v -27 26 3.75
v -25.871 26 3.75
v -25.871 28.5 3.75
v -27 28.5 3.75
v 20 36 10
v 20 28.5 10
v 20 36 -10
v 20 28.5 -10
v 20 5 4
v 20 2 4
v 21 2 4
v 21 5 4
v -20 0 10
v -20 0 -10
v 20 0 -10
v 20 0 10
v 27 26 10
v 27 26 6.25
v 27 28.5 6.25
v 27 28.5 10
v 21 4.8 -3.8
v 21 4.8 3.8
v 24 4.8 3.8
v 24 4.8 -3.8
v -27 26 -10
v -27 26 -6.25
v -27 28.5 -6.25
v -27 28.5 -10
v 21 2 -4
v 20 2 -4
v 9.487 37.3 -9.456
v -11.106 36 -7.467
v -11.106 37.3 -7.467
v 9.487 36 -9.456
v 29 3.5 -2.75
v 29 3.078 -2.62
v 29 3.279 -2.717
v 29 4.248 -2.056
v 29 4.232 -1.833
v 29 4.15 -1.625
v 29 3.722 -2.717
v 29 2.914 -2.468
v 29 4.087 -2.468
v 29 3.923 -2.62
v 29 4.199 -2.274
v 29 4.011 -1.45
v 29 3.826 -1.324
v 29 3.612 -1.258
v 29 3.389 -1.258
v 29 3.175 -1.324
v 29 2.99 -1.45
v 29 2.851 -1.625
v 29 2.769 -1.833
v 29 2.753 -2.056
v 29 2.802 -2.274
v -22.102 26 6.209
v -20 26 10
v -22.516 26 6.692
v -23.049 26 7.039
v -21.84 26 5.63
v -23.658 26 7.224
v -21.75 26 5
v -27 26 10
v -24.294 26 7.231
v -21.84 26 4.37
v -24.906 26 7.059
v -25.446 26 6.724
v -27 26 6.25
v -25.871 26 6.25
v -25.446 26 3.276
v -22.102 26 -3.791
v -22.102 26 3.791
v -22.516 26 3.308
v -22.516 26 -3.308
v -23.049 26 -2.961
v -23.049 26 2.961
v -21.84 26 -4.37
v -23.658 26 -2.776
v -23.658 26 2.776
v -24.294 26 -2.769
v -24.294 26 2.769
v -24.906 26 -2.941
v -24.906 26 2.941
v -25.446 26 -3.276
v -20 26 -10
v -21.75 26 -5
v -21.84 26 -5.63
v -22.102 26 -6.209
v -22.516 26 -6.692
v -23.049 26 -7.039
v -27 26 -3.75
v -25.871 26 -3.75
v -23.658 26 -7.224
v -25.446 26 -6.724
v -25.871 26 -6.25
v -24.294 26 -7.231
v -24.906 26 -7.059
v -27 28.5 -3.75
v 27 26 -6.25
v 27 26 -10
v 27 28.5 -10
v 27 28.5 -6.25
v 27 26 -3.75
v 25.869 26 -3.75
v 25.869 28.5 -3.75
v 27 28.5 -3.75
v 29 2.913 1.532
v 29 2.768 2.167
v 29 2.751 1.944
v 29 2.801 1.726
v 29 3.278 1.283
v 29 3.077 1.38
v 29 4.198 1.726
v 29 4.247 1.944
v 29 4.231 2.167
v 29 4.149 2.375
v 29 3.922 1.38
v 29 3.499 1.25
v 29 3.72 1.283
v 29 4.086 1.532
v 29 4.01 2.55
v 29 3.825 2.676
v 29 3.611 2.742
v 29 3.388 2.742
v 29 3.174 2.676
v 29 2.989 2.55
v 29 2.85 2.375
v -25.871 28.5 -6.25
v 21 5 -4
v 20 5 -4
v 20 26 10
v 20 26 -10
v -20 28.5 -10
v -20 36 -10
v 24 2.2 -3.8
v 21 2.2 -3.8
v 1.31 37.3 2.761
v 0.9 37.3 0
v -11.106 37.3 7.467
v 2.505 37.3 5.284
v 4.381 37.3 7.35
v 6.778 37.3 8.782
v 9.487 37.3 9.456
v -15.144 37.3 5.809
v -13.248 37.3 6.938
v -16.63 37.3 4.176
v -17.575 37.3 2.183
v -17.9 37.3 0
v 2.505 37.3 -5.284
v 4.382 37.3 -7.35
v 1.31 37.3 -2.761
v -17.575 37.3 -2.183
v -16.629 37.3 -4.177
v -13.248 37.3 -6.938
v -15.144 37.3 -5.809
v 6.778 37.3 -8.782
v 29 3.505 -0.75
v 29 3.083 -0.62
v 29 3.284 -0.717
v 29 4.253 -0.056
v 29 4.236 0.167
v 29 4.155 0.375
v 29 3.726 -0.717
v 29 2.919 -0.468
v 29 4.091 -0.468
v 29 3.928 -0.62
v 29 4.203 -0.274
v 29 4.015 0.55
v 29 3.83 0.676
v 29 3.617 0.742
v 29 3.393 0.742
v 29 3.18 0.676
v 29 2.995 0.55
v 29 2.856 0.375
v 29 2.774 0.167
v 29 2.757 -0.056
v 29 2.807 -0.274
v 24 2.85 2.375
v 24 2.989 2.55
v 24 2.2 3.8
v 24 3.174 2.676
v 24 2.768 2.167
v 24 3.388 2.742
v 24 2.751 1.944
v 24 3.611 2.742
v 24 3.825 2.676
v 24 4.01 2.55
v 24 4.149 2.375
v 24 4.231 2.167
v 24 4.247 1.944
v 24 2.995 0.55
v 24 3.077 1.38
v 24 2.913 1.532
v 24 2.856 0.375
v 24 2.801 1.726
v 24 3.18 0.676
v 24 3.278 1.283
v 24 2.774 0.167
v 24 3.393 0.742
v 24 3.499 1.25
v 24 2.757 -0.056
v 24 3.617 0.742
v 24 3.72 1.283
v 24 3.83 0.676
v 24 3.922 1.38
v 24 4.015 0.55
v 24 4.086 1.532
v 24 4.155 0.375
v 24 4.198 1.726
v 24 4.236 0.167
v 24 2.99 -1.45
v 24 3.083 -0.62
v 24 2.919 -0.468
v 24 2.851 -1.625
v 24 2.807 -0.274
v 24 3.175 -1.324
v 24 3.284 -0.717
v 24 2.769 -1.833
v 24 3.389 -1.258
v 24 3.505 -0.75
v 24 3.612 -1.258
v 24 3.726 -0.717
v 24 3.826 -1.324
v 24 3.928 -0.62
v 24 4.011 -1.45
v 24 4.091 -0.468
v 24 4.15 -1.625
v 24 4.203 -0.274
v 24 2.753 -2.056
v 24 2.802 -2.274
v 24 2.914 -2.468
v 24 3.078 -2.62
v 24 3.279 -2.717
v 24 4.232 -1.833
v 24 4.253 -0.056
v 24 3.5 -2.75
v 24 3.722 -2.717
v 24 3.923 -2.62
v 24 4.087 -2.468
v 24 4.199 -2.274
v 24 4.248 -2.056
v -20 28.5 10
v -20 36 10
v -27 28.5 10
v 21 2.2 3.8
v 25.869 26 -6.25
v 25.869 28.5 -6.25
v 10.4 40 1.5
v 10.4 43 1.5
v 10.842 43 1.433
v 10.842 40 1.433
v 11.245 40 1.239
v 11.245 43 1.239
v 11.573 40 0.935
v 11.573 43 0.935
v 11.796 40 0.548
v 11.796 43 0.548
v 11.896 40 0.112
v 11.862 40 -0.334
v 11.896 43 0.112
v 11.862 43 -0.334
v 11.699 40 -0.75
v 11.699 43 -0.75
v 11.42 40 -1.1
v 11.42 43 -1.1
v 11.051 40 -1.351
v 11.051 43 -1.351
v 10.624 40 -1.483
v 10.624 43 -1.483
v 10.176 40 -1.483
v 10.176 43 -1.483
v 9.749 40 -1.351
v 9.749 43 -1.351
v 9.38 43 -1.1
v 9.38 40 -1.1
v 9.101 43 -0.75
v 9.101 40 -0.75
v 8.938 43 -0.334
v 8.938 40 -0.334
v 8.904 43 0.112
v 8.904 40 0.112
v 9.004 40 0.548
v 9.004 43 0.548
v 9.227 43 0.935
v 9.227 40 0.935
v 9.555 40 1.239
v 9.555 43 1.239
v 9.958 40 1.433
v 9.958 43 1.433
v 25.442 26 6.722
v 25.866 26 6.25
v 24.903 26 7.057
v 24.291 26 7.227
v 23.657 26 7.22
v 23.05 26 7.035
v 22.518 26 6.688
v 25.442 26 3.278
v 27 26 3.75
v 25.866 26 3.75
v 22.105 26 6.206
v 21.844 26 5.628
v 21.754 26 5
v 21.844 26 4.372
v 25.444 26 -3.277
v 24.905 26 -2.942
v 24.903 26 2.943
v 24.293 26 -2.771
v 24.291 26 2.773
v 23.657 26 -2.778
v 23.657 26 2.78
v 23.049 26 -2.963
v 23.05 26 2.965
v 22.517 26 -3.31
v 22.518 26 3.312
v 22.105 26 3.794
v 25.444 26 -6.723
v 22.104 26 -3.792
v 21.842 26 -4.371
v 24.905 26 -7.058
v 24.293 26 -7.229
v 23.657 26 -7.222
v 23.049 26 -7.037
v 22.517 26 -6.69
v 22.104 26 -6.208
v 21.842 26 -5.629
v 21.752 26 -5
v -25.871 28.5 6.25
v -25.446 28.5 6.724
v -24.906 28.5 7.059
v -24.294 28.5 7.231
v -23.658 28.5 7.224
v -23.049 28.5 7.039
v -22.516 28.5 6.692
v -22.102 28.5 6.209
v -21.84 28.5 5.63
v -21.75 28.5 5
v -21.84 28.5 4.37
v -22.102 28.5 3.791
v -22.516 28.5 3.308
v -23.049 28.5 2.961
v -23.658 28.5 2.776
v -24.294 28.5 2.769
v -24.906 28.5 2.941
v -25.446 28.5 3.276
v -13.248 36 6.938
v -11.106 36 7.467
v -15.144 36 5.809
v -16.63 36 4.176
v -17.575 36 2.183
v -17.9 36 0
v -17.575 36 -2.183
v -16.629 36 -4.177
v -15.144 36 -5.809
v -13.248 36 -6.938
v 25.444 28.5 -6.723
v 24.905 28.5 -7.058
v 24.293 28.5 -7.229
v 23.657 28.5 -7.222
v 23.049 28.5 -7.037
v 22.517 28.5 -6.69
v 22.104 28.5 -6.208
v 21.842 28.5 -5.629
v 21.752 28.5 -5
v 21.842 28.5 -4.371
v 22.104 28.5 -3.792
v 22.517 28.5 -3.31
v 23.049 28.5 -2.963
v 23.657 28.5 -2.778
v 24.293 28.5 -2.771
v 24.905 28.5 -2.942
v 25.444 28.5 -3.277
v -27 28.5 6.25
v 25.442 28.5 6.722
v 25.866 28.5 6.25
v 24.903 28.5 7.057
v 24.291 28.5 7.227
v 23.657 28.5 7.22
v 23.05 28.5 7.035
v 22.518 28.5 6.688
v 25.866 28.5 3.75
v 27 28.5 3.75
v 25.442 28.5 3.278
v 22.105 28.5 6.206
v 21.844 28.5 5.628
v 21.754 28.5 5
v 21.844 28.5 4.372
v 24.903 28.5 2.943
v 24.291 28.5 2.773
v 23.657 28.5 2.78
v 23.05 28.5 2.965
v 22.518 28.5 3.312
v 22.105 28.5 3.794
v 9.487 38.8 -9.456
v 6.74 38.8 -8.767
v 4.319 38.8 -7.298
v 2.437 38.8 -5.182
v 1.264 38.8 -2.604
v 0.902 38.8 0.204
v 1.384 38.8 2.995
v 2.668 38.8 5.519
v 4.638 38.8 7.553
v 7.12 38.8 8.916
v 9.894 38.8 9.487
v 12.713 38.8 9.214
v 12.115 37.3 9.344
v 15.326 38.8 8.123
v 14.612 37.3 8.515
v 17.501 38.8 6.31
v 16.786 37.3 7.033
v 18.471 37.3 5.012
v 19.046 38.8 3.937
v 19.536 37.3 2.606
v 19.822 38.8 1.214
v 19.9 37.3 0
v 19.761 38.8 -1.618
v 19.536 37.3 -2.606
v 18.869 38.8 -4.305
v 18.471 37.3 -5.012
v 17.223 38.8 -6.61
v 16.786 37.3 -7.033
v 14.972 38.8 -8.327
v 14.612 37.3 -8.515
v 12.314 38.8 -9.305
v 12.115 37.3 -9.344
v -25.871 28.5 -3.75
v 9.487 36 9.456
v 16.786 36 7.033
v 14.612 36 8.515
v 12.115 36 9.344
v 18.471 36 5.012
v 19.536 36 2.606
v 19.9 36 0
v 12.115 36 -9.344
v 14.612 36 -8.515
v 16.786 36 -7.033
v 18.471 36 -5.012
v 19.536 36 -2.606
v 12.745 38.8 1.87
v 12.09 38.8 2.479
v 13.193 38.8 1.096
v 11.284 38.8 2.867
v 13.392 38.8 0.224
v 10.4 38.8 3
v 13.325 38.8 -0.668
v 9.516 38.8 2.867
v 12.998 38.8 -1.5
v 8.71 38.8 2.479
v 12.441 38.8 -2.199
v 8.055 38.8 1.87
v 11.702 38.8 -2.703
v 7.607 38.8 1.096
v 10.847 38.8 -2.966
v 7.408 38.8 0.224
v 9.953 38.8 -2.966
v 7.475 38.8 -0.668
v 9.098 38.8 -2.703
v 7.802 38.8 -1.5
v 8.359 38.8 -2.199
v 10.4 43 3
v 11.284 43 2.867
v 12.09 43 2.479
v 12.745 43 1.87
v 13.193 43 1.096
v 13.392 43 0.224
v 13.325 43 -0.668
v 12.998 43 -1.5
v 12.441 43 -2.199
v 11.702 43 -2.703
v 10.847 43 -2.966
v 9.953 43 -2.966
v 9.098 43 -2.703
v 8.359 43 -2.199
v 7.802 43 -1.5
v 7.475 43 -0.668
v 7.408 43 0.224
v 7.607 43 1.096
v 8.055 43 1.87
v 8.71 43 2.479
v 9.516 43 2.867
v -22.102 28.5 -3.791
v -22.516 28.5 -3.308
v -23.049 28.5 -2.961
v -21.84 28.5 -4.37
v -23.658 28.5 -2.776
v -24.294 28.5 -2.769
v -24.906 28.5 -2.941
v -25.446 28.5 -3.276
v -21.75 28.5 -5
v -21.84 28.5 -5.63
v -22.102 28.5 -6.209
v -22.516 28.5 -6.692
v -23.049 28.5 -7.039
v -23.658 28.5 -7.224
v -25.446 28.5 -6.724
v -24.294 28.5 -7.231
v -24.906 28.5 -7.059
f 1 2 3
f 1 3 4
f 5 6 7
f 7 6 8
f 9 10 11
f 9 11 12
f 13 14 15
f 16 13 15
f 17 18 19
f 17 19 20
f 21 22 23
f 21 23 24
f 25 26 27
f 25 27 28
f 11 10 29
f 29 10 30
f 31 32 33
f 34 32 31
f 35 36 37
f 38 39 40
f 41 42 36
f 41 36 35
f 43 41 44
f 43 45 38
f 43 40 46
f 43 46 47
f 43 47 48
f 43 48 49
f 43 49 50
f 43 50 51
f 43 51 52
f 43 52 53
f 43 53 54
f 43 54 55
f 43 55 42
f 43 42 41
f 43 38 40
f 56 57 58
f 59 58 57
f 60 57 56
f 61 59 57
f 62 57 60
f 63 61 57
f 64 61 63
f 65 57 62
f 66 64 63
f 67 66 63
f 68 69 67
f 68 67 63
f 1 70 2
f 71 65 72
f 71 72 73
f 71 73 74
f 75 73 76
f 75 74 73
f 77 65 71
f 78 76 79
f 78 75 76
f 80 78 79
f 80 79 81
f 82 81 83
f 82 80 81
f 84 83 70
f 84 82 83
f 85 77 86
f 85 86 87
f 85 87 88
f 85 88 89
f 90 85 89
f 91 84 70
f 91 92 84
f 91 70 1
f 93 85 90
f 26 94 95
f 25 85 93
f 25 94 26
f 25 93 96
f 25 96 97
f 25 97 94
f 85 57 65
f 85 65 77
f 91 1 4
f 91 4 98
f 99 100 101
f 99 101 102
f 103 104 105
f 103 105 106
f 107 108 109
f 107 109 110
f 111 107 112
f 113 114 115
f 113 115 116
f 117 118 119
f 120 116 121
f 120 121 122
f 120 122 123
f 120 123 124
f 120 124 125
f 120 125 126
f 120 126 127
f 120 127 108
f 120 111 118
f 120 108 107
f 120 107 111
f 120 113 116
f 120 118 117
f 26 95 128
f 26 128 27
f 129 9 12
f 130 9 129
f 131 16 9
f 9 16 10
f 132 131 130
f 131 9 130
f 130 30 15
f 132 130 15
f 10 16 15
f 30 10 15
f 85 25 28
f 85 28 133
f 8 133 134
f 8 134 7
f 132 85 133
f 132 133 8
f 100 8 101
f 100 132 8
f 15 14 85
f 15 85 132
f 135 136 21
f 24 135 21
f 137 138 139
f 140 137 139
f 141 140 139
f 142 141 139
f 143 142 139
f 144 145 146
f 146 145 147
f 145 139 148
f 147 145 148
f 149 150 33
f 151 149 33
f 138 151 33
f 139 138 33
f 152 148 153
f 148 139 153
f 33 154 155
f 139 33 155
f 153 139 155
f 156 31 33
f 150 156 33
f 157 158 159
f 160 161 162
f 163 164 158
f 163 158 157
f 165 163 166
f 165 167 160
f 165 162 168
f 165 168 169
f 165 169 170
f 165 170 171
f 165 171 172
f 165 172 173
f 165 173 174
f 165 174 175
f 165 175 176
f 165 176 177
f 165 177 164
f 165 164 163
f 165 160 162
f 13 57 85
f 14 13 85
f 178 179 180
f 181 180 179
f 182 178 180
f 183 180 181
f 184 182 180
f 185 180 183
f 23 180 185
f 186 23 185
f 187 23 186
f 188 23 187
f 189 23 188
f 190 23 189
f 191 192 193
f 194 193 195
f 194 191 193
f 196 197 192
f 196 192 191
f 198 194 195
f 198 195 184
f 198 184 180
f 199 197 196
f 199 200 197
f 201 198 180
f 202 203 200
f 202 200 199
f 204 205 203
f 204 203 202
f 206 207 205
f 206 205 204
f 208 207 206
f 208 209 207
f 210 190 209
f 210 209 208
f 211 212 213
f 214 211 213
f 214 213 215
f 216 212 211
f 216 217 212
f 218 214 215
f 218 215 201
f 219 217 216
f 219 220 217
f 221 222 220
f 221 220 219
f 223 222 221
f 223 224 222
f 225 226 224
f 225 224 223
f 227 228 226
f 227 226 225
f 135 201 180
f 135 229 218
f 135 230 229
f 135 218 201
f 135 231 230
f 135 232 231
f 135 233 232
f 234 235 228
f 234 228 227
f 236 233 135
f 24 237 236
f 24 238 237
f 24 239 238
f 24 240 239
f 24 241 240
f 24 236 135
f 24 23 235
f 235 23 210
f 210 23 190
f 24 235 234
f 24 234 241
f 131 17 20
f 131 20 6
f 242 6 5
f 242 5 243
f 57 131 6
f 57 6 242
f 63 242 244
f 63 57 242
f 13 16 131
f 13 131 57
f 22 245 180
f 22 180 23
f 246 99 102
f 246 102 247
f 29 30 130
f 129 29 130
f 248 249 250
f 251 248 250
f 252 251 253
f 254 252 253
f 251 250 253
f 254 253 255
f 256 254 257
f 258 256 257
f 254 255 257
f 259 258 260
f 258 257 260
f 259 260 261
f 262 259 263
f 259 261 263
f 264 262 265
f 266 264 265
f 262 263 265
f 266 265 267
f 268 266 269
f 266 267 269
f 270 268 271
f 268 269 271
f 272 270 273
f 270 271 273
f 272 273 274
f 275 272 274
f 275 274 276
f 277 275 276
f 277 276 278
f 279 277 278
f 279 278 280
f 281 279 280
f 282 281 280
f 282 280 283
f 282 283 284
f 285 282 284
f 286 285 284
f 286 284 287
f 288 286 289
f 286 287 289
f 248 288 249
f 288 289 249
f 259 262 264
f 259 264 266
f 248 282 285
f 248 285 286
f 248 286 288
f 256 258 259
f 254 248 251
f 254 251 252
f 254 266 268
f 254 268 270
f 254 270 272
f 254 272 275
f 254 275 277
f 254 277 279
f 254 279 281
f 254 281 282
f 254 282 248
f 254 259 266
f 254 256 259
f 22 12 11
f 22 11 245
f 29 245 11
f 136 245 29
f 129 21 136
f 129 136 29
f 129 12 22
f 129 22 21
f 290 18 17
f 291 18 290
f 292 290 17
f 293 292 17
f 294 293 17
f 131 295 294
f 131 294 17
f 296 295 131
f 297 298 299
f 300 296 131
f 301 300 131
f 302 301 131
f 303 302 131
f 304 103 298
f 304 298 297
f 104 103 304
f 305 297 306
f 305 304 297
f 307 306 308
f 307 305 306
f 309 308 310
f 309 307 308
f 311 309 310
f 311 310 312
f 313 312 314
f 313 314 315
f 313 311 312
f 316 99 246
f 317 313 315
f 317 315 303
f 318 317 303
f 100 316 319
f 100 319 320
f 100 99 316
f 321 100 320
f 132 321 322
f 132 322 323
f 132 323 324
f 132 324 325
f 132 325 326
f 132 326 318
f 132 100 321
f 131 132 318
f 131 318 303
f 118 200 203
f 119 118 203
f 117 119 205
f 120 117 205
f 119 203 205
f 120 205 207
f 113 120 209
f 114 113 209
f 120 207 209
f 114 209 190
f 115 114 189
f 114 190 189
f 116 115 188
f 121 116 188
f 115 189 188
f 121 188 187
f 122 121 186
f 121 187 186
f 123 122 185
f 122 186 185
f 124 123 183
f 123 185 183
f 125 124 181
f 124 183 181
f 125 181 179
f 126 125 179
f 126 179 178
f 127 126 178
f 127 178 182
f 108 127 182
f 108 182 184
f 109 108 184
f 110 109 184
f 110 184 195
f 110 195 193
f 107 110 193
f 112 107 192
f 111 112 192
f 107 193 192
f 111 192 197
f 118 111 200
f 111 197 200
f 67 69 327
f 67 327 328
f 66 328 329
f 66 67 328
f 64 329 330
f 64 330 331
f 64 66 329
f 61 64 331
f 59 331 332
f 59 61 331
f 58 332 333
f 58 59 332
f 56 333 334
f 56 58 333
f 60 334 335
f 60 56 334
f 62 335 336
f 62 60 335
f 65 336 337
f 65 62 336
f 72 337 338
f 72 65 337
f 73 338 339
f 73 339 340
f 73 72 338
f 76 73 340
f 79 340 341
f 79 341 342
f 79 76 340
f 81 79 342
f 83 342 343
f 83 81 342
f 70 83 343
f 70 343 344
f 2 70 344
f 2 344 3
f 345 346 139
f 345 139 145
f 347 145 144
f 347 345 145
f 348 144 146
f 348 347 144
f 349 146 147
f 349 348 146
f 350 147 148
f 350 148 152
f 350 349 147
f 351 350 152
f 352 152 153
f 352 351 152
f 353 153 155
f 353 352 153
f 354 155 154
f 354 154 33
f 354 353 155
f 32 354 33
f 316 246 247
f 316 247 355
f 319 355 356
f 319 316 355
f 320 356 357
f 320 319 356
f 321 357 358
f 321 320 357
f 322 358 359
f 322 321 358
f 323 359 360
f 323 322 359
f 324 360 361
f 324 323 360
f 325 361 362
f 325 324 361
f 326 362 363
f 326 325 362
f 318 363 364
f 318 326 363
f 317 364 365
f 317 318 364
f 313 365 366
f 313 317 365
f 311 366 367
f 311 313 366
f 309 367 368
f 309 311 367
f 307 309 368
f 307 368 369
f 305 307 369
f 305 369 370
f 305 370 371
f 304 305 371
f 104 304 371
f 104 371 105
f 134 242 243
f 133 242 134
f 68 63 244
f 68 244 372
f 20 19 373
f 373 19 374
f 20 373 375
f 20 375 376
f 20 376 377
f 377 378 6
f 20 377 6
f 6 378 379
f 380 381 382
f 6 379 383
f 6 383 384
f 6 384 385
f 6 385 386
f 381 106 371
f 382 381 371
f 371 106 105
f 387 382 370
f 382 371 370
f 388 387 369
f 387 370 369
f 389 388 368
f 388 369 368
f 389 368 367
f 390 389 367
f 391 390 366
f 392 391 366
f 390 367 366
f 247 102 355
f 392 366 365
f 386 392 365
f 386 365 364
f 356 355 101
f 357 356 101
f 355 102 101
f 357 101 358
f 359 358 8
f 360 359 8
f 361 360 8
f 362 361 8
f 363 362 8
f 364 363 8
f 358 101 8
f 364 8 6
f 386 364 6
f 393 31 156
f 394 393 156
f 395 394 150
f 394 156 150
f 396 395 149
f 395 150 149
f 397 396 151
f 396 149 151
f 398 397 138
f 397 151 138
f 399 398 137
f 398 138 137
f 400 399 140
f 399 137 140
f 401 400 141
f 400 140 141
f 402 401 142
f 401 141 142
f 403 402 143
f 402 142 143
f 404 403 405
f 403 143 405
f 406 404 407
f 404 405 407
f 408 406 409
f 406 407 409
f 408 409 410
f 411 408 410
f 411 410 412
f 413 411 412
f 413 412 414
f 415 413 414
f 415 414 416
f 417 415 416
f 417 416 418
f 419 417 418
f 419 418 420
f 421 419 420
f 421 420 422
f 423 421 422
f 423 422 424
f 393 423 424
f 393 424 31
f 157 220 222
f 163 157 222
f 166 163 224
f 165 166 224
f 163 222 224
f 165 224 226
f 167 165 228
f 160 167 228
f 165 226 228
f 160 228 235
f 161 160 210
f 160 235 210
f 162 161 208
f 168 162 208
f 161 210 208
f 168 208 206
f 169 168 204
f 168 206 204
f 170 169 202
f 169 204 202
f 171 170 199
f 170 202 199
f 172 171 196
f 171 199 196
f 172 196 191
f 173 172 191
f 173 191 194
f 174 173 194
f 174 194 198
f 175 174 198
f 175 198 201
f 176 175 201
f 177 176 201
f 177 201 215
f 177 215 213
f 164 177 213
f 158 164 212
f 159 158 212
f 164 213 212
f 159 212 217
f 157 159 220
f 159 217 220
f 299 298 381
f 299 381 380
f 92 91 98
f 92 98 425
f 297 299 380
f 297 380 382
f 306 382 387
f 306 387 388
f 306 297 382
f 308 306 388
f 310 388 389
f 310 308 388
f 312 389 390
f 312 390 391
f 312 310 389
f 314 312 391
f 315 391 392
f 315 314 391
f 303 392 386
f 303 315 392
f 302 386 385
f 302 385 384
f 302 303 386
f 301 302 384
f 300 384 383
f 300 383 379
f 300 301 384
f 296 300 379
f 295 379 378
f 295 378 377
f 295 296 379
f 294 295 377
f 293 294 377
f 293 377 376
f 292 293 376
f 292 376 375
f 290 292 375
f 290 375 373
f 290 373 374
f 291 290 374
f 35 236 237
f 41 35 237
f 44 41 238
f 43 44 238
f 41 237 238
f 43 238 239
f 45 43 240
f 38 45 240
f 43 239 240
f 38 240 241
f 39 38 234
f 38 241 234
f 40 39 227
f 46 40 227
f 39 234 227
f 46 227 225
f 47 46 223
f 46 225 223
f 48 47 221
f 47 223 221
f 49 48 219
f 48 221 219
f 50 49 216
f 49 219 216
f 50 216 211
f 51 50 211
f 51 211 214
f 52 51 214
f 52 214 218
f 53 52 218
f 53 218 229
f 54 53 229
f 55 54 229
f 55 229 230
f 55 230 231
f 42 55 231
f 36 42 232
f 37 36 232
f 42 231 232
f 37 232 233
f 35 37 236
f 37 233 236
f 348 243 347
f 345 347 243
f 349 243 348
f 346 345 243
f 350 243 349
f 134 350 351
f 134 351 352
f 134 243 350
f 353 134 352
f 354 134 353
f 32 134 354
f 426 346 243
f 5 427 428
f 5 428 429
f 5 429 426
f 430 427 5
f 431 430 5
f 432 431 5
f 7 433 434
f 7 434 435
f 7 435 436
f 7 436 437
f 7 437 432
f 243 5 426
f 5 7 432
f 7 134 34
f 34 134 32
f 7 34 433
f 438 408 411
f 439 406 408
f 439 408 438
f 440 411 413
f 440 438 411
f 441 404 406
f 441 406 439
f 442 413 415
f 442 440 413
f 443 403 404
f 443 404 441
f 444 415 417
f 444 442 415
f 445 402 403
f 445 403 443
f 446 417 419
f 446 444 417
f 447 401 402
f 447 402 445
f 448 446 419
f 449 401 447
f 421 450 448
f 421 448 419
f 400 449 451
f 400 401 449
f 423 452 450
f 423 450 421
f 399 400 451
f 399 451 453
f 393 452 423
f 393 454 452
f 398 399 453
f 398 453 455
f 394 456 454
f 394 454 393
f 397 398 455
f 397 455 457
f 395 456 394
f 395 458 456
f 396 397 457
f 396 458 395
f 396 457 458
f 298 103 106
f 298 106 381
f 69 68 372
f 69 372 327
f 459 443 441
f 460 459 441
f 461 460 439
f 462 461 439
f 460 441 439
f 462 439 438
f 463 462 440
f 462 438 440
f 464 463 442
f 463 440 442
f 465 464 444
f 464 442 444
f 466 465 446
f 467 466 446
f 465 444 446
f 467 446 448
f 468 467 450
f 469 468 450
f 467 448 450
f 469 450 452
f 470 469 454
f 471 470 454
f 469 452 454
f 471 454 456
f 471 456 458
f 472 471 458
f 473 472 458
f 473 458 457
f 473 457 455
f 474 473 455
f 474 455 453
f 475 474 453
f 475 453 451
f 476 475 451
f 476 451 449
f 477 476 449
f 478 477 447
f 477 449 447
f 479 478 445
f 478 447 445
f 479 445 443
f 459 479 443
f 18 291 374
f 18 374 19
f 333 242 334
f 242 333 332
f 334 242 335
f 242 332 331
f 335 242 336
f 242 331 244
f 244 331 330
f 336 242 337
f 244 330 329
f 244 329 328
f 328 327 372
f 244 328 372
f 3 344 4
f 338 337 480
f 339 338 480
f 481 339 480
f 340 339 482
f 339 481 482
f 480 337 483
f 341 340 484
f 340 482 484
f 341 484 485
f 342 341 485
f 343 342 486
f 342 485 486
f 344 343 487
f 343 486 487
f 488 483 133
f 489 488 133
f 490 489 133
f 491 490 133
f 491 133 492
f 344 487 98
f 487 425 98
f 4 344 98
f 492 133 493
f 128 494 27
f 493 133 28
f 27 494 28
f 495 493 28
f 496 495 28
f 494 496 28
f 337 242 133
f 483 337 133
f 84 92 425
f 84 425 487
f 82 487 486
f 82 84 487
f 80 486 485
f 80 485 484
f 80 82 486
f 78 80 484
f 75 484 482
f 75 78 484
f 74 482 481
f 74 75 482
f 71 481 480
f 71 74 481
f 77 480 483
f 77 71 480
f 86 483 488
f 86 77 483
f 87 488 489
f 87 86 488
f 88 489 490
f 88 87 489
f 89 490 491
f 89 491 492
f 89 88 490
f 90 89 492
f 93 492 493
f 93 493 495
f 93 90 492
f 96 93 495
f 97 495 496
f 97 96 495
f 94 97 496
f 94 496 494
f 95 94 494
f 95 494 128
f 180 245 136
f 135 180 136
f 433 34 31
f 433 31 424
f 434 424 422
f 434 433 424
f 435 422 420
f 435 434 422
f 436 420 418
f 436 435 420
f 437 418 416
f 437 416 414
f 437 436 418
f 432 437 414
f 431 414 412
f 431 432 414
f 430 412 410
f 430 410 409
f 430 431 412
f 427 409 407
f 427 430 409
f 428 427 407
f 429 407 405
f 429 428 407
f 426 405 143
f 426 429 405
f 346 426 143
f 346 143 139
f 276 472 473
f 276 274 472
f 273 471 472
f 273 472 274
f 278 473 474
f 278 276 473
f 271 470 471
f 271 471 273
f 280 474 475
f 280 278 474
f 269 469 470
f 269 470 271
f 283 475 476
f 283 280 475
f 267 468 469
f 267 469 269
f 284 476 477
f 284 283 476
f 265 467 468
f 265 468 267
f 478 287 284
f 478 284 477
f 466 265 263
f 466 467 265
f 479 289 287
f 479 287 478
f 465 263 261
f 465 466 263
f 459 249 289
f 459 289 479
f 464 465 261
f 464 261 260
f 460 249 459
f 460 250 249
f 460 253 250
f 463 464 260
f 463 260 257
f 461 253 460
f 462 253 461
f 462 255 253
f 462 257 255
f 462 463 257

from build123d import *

# Parameters (mm, degrees)
SKETCH_1_W          = 40
SKETCH_1_H          = 20
EXTRUDE_1_DEPTH     = 26
EXTRUDE_2_DEPTH     = 2.5
SKETCH_3_W          = 40
SKETCH_3_H          = 20
EXTRUDE_3_DEPTH     = 7.5
EXTRUDE_4_DEPTH     = 1.3
SKETCH_5_R          = 9.5
EXTRUDE_5_DEPTH     = 1.5
SKETCH_6_R          = 3
EXTRUDE_6_DEPTH     = 4.2
SKETCH_7_W          = 8
SKETCH_7_H          = 3
EXTRUDE_7_DEPTH     = 1
SKETCH_8_W          = 7.6
SKETCH_8_H          = 2.6
EXTRUDE_8_DEPTH     = 3
SKETCH_9_R          = 0.75
EXTRUDE_9_DEPTH     = 5
SKETCH_10_R         = 1.5
CUT_EXTRUDE_1_DEPTH = 3


with BuildPart() as part:
    # 스케치1 → 보스-돌출1 (new body)
    with BuildSketch(Plane(origin=(0, 0, 0), x_dir=(1, 0, 0), z_dir=(0, 1, 0))):
        Rectangle(SKETCH_1_W, SKETCH_1_H)
    extrude(amount=EXTRUDE_1_DEPTH)

    # 스케치2 → 보스-돌출2 (add)
    with BuildSketch(Plane(origin=(0, 26, 0), x_dir=(1, 0, 0), z_dir=(0, 1, 0))):
        with BuildLine():
            Line((-27, 10), (27, 10))
            Line((27, 10), (27, 6.25))
            Line((27, 6.25), (25.868643032, 6.25))
            ThreePointArc((25.868643032, 6.25), (21.751817004, 5), (25.868643032, 3.75))
            Line((25.868643032, 3.75), (27, 3.75))
            Line((27, 3.75), (27, -3.75))
            Line((27, -3.75), (25.866173833, -3.75))
            ThreePointArc((25.866173833, -3.75), (21.753868932, -5), (25.866173833, -6.25))
            Line((25.866173833, -6.25), (27, -6.25))
            Line((27, -6.25), (27, -10))
            Line((27, -10), (-27, -10))
            Line((-27, -10), (-27, -6.25))
            Line((-27, -6.25), (-25.870828693, -6.25))
            ThreePointArc((-25.870828693, -6.25), (-21.75, -5), (-25.870828693, -3.75))
            Line((-25.870828693, -3.75), (-27, -3.75))
            Line((-27, -3.75), (-27, 3.75))
            Line((-27, 3.75), (-25.870828693, 3.75))
            ThreePointArc((-25.870828693, 3.75), (-21.75, 5), (-25.870828693, 6.25))
            Line((-25.870828693, 6.25), (-27, 6.25))
            Line((-27, 6.25), (-27, 10))
        make_face()
    extrude(amount=EXTRUDE_2_DEPTH)

    # 스케치3 → 보스-돌출3 (add)
    with BuildSketch(Plane(origin=(0, 28.5, 0), x_dir=(1, 0, 0), z_dir=(0, 1, 0))):
        Rectangle(SKETCH_3_W, SKETCH_3_H)
    extrude(amount=EXTRUDE_3_DEPTH)

    # 스케치4 → 보스-돌출4 (add)
    with BuildSketch(Plane(origin=(0, 36, 0), x_dir=(1, 0, 0), z_dir=(0, 1, 0))):
        with BuildLine():
            Line((-11.105930899, 7.466746492), (9.486550883, 9.4559828))
            ThreePointArc((9.486550883, 9.4559828), (19.9, -1.9624e-05), (9.486511816, -9.455979026))
            Line((9.486511816, -9.455979026), (-11.105960469, -7.466657767))
            ThreePointArc((-11.105960469, -7.466657767), (-17.9, 5.7816e-05), (-11.105930899, 7.466746492))
        make_face()
    extrude(amount=EXTRUDE_4_DEPTH)

    # 스케치5 → 보스-돌출5 (add)
    with BuildSketch(Plane(origin=(0, 37.3, 0), x_dir=(1, 0, 0), z_dir=(0, 1, 0))):
        with Locations(Location((10.4, 0, 0), (0, 0, 95.517659112))):
            Circle(SKETCH_5_R)
    extrude(amount=EXTRUDE_5_DEPTH)

    # 스케치6 → 보스-돌출6 (add)
    with BuildSketch(Plane(origin=(0, 38.8, 0), x_dir=(1, 0, 0), z_dir=(0, 1, 0))):
        with Locations(Location((10.4, 0, 0), (0, 0, 270))):
            Circle(SKETCH_6_R)
    extrude(amount=EXTRUDE_6_DEPTH)

    # 스케치7 → 보스-돌출7 (add)
    with BuildSketch(Plane(origin=(20, 0, 0), x_dir=(0, 0, -1), z_dir=(1, 0, 0))):
        with Locations((0, 3.5)):
            Rectangle(SKETCH_7_W, SKETCH_7_H)
    extrude(amount=EXTRUDE_7_DEPTH)

    # 스케치8 → 보스-돌출8 (add)
    with BuildSketch(Plane(origin=(21, 0, 0), x_dir=(0, 0, -1), z_dir=(1, 0, 0))):
        with Locations((0, 3.5)):
            Rectangle(SKETCH_8_W, SKETCH_8_H)
    extrude(amount=EXTRUDE_8_DEPTH)

    # 스케치9 → 보스-돌출9 (add)
    with BuildSketch(Plane(origin=(24, 0, 0), x_dir=(0, 0, -1), z_dir=(1, 0, 0))):
        with Locations((0, 3.505070748)):
            Circle(SKETCH_9_R)
        with Locations((-1.999991967, 3.499402084)):
            Circle(SKETCH_9_R)
        with Locations((1.99999474, 3.500483844)):
            Circle(SKETCH_9_R)
    extrude(amount=EXTRUDE_9_DEPTH)

    # 스케치10 → 컷-돌출1 (cut)
    with BuildSketch(Plane(origin=(0, 43, 0), x_dir=(1, 0, 0), z_dir=(0, 1, 0))):
        with Locations(Location((10.4, 0, 0), (0, 0, 270))):
            Circle(SKETCH_10_R)
    extrude(amount=-CUT_EXTRUDE_1_DEPTH, mode=Mode.SUBTRACT)


solid = part.part
